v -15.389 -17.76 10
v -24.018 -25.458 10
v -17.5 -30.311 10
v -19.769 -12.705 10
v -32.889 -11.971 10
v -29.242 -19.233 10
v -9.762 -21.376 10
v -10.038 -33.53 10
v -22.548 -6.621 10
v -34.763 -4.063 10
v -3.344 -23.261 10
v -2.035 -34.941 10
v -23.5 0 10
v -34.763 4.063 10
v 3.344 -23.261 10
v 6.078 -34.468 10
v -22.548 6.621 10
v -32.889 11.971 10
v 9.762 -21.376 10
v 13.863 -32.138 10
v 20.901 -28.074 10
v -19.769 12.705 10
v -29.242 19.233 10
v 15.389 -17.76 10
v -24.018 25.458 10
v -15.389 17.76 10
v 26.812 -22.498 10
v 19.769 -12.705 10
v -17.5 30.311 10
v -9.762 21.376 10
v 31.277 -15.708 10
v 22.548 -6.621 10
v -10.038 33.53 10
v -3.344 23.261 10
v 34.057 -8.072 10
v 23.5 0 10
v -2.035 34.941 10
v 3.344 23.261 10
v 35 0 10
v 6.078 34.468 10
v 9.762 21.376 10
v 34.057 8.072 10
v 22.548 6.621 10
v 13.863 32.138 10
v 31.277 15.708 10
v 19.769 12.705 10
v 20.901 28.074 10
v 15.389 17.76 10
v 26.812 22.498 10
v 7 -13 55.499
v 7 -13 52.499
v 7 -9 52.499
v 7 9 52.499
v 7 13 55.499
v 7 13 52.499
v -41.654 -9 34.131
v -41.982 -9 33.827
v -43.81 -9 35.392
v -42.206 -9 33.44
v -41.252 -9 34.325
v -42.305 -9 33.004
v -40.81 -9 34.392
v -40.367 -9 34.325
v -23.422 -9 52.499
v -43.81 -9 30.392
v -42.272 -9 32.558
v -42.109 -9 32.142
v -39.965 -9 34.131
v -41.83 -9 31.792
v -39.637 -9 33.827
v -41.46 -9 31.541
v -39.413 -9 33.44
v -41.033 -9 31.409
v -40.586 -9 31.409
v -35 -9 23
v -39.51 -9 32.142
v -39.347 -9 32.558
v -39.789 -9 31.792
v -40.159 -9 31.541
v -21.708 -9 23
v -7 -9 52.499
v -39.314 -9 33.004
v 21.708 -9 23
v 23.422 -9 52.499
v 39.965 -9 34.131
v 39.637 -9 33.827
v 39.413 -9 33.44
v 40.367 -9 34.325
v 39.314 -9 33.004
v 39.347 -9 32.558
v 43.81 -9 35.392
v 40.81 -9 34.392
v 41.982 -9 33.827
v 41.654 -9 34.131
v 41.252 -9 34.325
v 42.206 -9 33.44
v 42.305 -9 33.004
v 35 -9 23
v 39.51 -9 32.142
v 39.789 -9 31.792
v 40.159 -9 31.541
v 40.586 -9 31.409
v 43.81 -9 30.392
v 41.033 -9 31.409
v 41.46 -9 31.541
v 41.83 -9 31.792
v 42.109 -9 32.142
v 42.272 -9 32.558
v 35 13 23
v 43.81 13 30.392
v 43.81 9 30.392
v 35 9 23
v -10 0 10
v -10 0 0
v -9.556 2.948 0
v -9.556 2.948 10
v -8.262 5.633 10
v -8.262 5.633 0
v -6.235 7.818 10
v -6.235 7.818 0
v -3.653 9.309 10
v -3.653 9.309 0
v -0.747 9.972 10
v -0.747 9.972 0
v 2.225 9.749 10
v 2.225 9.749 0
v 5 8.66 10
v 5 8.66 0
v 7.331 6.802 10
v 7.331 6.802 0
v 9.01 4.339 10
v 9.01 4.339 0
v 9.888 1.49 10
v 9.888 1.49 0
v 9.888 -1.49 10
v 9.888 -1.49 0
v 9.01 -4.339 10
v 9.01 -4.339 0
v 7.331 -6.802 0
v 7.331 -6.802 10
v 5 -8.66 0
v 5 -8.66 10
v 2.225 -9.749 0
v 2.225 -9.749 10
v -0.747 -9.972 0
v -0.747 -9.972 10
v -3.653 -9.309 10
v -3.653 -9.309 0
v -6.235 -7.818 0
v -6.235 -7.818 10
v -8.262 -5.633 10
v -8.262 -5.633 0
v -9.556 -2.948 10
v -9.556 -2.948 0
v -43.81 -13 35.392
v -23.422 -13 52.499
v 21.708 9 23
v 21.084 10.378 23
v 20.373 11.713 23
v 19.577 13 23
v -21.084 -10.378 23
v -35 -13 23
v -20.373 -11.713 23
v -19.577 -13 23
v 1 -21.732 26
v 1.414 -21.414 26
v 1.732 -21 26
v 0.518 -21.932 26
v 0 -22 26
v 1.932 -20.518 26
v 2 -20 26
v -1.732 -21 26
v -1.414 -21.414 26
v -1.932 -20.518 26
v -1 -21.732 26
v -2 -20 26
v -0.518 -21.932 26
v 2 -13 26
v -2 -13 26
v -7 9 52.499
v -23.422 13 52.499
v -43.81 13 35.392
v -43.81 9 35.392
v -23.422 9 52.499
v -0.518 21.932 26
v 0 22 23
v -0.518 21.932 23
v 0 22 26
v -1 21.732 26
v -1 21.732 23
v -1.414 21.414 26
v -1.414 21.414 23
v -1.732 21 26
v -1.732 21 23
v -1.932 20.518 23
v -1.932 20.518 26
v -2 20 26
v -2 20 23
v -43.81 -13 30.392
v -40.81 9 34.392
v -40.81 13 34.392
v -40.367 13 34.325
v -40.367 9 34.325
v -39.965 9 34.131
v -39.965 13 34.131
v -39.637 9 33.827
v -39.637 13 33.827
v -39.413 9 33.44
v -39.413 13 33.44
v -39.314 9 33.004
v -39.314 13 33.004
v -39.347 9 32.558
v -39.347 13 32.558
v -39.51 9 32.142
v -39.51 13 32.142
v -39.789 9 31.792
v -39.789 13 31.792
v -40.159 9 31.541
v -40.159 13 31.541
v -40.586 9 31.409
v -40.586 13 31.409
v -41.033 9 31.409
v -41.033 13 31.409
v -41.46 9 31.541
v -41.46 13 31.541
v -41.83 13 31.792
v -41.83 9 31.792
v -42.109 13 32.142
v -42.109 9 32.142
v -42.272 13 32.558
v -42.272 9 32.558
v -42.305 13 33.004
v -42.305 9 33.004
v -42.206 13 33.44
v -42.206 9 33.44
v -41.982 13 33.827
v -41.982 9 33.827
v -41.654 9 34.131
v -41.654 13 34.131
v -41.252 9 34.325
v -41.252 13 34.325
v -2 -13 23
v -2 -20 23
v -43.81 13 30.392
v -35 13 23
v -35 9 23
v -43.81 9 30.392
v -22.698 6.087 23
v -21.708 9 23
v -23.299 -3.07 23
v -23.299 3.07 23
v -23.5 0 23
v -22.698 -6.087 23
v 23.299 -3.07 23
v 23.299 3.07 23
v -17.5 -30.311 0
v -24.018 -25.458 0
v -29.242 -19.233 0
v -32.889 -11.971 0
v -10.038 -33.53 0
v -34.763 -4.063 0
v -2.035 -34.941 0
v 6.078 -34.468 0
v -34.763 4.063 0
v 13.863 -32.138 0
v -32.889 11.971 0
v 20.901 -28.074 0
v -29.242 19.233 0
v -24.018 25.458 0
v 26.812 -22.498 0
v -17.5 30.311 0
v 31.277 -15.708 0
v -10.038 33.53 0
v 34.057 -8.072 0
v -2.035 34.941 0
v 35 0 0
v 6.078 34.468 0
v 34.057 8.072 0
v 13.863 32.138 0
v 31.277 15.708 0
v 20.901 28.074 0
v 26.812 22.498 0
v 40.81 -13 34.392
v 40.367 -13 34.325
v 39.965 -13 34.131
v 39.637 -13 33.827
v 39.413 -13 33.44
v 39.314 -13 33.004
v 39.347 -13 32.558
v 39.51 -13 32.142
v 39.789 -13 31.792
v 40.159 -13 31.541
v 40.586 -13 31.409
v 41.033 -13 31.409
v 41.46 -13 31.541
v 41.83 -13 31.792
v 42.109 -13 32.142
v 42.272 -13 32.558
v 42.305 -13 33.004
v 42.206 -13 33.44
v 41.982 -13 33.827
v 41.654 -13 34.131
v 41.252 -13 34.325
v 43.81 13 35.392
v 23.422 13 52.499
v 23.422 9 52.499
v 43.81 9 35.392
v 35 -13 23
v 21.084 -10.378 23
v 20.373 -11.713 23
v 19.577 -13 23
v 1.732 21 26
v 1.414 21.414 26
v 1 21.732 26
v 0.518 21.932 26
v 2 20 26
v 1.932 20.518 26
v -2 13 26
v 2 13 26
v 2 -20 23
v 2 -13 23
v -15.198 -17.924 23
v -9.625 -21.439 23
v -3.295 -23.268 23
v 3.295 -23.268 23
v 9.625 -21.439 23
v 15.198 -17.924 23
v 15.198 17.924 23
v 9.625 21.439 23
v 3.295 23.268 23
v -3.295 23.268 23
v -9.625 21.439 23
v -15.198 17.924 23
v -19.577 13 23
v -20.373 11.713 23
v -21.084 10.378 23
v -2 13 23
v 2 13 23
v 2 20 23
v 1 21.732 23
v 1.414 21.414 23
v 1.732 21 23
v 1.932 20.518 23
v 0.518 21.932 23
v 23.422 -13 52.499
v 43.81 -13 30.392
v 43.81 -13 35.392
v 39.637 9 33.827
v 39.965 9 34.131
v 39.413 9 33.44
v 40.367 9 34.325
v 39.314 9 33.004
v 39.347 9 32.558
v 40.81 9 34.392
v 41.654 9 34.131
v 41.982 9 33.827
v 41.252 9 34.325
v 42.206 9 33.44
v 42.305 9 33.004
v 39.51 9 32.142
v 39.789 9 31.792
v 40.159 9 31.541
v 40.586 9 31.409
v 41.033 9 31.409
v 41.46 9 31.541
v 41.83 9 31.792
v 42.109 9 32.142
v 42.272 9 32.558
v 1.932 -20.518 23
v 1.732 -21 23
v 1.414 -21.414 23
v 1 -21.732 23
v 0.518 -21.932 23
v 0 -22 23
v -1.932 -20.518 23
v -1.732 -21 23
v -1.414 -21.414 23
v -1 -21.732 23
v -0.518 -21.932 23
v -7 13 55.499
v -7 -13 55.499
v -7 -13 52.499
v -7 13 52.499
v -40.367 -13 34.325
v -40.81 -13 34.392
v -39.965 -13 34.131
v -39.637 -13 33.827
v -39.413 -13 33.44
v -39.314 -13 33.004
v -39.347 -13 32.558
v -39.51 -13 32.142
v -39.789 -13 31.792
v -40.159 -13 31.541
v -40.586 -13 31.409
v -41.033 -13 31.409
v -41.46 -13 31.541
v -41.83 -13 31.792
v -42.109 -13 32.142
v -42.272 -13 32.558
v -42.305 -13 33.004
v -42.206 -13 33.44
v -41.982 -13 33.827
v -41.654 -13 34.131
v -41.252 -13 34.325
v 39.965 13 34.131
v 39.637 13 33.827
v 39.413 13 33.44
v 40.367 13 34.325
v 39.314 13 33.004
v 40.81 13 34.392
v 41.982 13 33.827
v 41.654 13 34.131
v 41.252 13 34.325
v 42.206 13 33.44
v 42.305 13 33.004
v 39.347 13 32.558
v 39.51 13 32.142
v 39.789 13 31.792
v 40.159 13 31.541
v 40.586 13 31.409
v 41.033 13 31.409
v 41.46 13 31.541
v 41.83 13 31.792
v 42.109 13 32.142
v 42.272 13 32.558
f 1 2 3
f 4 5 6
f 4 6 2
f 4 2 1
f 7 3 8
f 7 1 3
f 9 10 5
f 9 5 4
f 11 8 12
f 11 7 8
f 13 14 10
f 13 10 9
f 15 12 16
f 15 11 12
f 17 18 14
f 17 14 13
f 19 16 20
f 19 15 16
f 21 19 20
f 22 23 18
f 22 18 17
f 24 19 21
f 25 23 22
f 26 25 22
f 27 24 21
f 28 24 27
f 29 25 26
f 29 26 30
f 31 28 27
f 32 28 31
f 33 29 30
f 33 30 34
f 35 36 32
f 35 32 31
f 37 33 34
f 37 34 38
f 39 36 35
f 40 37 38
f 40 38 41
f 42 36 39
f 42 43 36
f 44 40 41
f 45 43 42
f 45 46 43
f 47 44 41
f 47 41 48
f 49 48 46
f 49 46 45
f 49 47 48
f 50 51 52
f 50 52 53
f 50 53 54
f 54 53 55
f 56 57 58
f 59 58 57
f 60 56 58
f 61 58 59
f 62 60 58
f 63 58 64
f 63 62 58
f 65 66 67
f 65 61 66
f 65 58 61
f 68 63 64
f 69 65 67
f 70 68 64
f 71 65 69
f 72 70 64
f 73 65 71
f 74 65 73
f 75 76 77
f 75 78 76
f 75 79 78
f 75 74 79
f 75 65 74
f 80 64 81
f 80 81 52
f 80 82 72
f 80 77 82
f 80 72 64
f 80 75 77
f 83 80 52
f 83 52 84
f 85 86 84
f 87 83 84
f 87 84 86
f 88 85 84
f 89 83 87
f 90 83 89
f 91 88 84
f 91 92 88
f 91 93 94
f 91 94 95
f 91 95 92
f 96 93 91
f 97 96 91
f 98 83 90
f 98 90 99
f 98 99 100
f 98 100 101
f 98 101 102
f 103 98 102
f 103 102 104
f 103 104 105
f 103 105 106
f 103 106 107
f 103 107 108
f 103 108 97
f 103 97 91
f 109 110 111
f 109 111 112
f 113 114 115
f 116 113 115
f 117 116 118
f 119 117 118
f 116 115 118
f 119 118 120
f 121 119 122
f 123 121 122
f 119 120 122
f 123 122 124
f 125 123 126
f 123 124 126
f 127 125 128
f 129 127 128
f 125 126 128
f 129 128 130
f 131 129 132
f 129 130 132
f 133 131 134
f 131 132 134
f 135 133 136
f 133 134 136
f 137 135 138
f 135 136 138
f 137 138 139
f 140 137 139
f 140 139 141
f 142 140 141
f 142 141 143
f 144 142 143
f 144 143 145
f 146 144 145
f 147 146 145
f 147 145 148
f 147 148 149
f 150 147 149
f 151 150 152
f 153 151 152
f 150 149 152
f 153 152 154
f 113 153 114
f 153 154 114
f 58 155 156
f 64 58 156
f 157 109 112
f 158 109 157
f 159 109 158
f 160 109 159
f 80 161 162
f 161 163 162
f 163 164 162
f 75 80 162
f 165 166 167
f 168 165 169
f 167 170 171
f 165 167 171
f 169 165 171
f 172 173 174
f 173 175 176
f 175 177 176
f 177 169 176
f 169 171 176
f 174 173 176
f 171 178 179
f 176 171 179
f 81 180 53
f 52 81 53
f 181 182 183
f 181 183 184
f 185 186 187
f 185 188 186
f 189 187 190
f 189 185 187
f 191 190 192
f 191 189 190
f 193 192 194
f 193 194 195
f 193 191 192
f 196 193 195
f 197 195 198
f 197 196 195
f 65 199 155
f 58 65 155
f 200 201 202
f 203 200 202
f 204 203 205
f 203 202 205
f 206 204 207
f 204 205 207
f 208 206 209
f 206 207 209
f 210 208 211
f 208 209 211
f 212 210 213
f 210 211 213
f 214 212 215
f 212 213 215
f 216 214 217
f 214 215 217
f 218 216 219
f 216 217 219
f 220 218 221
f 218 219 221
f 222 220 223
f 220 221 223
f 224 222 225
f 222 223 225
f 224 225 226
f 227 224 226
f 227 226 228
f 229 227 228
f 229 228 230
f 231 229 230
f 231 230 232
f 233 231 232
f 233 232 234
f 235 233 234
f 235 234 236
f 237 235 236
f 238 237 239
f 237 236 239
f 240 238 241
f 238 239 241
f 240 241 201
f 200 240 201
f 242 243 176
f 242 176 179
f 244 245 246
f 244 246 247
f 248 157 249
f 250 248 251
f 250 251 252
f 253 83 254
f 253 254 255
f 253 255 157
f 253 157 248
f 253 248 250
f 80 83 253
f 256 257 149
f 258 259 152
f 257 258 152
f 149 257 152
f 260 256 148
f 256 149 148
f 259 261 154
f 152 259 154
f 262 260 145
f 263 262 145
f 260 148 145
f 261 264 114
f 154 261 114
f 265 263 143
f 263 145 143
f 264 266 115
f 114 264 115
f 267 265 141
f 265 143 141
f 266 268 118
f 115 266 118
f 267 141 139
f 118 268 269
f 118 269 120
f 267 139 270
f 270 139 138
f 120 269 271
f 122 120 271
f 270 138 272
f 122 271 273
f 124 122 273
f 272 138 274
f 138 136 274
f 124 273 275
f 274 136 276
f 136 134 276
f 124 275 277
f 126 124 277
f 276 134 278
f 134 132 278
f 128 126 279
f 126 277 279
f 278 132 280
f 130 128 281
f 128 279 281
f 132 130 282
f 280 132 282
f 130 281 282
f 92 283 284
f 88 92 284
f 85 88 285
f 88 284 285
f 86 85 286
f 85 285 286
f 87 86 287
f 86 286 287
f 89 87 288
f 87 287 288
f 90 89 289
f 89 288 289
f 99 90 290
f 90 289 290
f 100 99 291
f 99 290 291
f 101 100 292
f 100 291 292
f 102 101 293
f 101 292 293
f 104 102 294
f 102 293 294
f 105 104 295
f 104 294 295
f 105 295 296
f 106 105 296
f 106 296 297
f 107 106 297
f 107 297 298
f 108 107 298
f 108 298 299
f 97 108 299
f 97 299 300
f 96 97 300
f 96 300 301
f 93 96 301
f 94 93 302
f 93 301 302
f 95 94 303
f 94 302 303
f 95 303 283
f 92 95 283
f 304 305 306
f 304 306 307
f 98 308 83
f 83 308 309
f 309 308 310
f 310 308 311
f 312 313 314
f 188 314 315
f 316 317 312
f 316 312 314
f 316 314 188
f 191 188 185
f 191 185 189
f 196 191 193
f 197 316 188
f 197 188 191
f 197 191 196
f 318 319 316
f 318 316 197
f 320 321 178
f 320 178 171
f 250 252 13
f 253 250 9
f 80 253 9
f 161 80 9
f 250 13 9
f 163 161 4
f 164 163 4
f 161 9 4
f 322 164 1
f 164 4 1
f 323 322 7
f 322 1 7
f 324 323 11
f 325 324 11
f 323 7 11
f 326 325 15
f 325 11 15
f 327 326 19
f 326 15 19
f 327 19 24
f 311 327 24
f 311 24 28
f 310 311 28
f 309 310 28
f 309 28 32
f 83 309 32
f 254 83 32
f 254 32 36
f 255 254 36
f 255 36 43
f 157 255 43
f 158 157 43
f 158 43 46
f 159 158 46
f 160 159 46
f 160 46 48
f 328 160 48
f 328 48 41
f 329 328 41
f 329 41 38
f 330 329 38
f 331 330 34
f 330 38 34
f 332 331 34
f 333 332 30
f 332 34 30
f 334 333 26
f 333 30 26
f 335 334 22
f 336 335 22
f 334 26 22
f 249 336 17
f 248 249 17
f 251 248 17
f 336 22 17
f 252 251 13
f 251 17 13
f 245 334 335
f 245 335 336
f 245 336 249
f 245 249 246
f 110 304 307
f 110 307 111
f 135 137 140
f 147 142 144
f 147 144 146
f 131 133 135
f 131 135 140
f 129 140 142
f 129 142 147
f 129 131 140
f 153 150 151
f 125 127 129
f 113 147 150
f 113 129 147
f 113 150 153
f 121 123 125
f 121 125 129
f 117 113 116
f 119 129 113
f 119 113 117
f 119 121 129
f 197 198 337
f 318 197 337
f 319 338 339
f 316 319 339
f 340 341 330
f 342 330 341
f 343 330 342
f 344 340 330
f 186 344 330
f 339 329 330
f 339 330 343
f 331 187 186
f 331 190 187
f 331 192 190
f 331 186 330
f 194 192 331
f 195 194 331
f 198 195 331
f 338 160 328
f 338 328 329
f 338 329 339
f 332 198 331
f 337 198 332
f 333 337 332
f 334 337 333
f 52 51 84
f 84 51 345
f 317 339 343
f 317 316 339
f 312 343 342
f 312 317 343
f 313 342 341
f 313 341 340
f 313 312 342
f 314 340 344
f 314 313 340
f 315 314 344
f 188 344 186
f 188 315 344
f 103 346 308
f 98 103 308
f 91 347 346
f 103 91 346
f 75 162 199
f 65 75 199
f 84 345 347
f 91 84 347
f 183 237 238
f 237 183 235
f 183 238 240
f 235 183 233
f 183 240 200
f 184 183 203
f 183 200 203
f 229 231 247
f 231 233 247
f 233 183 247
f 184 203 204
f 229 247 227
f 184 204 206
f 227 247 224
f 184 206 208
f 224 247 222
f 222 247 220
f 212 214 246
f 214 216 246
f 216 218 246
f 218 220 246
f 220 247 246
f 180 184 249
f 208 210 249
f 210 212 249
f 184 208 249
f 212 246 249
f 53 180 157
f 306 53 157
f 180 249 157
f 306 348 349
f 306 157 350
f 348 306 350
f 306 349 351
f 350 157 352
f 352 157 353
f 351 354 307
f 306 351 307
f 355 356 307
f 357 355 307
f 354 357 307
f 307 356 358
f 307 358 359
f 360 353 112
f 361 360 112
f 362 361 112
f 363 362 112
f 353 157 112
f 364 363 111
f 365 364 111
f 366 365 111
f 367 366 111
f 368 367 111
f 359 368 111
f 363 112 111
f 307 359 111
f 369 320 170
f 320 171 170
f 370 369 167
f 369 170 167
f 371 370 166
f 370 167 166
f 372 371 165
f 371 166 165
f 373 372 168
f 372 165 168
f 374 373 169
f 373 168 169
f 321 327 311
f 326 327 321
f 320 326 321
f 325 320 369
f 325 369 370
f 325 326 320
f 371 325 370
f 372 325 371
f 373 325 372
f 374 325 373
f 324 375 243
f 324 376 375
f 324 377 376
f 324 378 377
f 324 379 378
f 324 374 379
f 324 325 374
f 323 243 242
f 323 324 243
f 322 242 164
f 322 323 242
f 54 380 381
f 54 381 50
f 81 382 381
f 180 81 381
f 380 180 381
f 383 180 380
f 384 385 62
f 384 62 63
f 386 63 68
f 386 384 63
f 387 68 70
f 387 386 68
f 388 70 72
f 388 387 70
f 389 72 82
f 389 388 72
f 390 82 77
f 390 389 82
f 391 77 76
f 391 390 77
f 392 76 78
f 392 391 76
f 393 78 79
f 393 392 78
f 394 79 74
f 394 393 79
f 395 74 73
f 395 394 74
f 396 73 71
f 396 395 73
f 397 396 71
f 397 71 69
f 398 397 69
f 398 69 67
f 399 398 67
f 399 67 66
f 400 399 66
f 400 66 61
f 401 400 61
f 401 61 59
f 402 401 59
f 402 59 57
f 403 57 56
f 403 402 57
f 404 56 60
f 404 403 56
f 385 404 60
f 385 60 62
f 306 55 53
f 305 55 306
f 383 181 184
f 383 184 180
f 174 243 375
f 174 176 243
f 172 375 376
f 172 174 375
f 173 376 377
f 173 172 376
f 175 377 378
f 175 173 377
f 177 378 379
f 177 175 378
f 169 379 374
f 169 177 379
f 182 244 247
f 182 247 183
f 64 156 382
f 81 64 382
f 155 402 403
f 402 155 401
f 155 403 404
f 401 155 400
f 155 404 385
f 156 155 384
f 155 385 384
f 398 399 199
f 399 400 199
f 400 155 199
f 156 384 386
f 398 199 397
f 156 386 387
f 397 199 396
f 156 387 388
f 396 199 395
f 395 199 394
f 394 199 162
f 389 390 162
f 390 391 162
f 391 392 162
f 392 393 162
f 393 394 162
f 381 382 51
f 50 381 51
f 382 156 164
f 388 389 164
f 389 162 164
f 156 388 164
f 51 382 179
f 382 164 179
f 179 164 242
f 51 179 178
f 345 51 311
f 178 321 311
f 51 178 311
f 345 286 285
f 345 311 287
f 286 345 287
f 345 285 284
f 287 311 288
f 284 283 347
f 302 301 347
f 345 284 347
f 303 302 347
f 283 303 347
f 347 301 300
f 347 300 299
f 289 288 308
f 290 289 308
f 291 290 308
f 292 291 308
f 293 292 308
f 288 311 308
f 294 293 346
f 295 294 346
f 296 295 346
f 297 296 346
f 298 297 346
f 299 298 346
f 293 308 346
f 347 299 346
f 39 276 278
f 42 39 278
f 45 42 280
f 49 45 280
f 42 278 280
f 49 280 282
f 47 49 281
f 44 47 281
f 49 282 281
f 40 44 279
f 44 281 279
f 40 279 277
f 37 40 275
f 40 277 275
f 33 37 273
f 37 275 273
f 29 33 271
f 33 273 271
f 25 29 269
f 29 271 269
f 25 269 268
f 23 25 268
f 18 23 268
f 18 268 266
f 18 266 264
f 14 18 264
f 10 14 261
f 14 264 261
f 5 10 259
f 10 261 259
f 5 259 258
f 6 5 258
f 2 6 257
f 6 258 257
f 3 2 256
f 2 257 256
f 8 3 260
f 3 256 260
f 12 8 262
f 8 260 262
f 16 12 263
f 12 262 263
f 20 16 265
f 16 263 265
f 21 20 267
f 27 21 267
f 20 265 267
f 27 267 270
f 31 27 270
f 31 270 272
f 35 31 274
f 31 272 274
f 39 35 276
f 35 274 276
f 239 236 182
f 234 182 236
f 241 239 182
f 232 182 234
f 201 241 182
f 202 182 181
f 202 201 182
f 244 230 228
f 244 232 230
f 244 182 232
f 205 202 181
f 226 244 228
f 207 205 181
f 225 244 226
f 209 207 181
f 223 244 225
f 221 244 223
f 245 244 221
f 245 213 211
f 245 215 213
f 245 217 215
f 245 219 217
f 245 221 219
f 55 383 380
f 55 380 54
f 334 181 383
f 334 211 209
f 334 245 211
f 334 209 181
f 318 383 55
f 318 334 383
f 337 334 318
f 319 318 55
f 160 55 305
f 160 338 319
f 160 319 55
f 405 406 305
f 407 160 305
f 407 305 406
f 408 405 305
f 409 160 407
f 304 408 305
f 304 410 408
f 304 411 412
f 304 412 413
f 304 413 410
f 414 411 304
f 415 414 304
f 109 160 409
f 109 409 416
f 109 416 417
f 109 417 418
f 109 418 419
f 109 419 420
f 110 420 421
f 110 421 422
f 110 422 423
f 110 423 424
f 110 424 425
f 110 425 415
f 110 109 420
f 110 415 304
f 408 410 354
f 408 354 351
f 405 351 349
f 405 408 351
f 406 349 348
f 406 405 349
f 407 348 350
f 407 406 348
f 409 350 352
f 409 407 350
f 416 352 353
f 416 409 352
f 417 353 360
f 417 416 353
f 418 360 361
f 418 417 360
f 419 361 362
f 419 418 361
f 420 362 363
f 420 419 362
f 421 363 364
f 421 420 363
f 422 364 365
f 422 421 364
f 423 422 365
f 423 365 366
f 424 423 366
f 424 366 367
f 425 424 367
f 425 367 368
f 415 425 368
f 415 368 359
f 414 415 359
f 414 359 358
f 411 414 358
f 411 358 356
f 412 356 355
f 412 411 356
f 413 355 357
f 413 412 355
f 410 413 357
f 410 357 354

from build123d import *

# Parameters (mm, degrees)
SKETCH1_R               = 35
BOSS_EXTRUDE1_DEPTH     = 10
SKETCH2_R               = 23.5
BOSS_EXTRUDE2_DEPTH     = 13
BOSS_EXTRUDE3_DEPTH     = 4
SKETCH4_R               = 1.5
CUT_EXTRUDE1_DEPTH      = 4
MIRROR2_COPY_1_SKETCH_R = 1.5
MIRROR2_COPY_1_DEPTH    = 4
BOSS_EXTRUDE4_DEPTH     = 3
FILLET1_R               = 2
FILLET1_OF_MIRROR3_R    = 2
SKETCH6_W               = 14
SKETCH6_H               = 26
BOSS_EXTRUDE5_DEPTH     = 3
SKETCH7_R               = 10
CUT_EXTRUDE3_DEPTH      = 10


with BuildPart() as part:
    # Sketch1 → Boss-Extrude1 (new body)
    with BuildSketch(Plane.XY):
        Circle(SKETCH1_R)
    extrude(amount=BOSS_EXTRUDE1_DEPTH)

    # Sketch2 → Boss-Extrude2 (add)
    with BuildSketch(Plane.XY.offset(10)):
        with Locations(Location((0, 0, 0), (0, 0, 180))):
            Circle(SKETCH2_R)
    extrude(amount=BOSS_EXTRUDE2_DEPTH)

    # Sketch3 → Boss-Extrude3 (add)
    with BuildSketch(Plane(origin=(0, 13, 0), x_dir=(1, 0, 0), z_dir=(0, 1, 0))):
        Polygon((35, -23), (-35, -23), (-43.809511096, -30.392057511), (-43.809511096, -35.392057511), (-23.422250333, -52.499000499), (23.422250333, -52.499000499), (43.809511096, -35.392057511), (43.809511096, -30.392057511), align=None)
    boss_extrude3 = extrude(amount=-BOSS_EXTRUDE3_DEPTH)

    # Sketch4 → Cut-Extrude1 (cut)
    with BuildSketch(Plane(origin=(0, 13, 0), x_dir=(1, 0, 0), z_dir=(0, 1, 0))):
        with Locations(Location((-40.809511096, -32.892057511, 0), (0, 0, 270))):
            Circle(SKETCH4_R)
    cut_extrude1 = extrude(amount=-CUT_EXTRUDE1_DEPTH, mode=Mode.SUBTRACT)

    # Mirror1: Cut-Extrude1 across plane
    add(cut_extrude1.mirror(Plane(origin=(0, 0, 0), x_dir=(0, 0, 1), z_dir=(1, 0, 0))), mode=Mode.SUBTRACT)

    # Mirror2: Boss-Extrude3, Cut-Extrude1 across plane
    add(boss_extrude3.mirror(Plane.ZX))
    add(cut_extrude1.mirror(Plane.ZX), mode=Mode.SUBTRACT)

    # Mirror2 copy 1 sketch → Mirror2 copy 1 (cut)
    with BuildSketch(Plane(origin=(0, -13, 0), x_dir=(-1, 0, 0), z_dir=(0, -1, 0))):
        with Locations(Location((-40.809511096, -32.892057511, 0), (0, 0, 270))):
            Circle(MIRROR2_COPY_1_SKETCH_R)
    extrude(amount=-MIRROR2_COPY_1_DEPTH, mode=Mode.SUBTRACT)

    # Sketch5 → Boss-Extrude4 (add)
    with BuildSketch(Plane.XY.offset(23)):
        Polygon((0, -13), (2, -13), (2, -22), (0, -22), (-2, -22), (-2, -13), align=None)
    boss_extrude4 = extrude(amount=BOSS_EXTRUDE4_DEPTH)

    # Fillet1
    fillet1_edges = [part.edges().sort_by_distance(p)[0] for p in [
        (-2, -22, 24.5),
        (2, -22, 24.5),
    ]]
    fillet(fillet1_edges, radius=FILLET1_R - 0.0001)  # a hair under: the kernel refuses the full size

    # Mirror3: Boss-Extrude4 across plane
    add(boss_extrude4.mirror(Plane.ZX))

    # Fillet1 of Mirror3
    fillet1_of_mirror3_edges = [part.edges().sort_by_distance(p)[0] for p in [
        (-2, 22, 24.5),
        (2, 22, 24.5),
    ]]
    fillet(fillet1_of_mirror3_edges, radius=FILLET1_OF_MIRROR3_R - 0.0001)  # a hair under: the kernel refuses the full size

    # Sketch6 → Boss-Extrude5 (add)
    with BuildSketch(Plane.XY.offset(52.499000499)):
        Rectangle(SKETCH6_W, SKETCH6_H)
    extrude(amount=BOSS_EXTRUDE5_DEPTH)

    # Sketch7 → Cut-Extrude3 (cut)
    with BuildSketch(Plane(origin=(0, 0, 0), x_dir=(-1, 0, 0), z_dir=(0, 0, -1))):
        Circle(SKETCH7_R)
    extrude(amount=-CUT_EXTRUDE3_DEPTH, mode=Mode.SUBTRACT)


solid = part.part
